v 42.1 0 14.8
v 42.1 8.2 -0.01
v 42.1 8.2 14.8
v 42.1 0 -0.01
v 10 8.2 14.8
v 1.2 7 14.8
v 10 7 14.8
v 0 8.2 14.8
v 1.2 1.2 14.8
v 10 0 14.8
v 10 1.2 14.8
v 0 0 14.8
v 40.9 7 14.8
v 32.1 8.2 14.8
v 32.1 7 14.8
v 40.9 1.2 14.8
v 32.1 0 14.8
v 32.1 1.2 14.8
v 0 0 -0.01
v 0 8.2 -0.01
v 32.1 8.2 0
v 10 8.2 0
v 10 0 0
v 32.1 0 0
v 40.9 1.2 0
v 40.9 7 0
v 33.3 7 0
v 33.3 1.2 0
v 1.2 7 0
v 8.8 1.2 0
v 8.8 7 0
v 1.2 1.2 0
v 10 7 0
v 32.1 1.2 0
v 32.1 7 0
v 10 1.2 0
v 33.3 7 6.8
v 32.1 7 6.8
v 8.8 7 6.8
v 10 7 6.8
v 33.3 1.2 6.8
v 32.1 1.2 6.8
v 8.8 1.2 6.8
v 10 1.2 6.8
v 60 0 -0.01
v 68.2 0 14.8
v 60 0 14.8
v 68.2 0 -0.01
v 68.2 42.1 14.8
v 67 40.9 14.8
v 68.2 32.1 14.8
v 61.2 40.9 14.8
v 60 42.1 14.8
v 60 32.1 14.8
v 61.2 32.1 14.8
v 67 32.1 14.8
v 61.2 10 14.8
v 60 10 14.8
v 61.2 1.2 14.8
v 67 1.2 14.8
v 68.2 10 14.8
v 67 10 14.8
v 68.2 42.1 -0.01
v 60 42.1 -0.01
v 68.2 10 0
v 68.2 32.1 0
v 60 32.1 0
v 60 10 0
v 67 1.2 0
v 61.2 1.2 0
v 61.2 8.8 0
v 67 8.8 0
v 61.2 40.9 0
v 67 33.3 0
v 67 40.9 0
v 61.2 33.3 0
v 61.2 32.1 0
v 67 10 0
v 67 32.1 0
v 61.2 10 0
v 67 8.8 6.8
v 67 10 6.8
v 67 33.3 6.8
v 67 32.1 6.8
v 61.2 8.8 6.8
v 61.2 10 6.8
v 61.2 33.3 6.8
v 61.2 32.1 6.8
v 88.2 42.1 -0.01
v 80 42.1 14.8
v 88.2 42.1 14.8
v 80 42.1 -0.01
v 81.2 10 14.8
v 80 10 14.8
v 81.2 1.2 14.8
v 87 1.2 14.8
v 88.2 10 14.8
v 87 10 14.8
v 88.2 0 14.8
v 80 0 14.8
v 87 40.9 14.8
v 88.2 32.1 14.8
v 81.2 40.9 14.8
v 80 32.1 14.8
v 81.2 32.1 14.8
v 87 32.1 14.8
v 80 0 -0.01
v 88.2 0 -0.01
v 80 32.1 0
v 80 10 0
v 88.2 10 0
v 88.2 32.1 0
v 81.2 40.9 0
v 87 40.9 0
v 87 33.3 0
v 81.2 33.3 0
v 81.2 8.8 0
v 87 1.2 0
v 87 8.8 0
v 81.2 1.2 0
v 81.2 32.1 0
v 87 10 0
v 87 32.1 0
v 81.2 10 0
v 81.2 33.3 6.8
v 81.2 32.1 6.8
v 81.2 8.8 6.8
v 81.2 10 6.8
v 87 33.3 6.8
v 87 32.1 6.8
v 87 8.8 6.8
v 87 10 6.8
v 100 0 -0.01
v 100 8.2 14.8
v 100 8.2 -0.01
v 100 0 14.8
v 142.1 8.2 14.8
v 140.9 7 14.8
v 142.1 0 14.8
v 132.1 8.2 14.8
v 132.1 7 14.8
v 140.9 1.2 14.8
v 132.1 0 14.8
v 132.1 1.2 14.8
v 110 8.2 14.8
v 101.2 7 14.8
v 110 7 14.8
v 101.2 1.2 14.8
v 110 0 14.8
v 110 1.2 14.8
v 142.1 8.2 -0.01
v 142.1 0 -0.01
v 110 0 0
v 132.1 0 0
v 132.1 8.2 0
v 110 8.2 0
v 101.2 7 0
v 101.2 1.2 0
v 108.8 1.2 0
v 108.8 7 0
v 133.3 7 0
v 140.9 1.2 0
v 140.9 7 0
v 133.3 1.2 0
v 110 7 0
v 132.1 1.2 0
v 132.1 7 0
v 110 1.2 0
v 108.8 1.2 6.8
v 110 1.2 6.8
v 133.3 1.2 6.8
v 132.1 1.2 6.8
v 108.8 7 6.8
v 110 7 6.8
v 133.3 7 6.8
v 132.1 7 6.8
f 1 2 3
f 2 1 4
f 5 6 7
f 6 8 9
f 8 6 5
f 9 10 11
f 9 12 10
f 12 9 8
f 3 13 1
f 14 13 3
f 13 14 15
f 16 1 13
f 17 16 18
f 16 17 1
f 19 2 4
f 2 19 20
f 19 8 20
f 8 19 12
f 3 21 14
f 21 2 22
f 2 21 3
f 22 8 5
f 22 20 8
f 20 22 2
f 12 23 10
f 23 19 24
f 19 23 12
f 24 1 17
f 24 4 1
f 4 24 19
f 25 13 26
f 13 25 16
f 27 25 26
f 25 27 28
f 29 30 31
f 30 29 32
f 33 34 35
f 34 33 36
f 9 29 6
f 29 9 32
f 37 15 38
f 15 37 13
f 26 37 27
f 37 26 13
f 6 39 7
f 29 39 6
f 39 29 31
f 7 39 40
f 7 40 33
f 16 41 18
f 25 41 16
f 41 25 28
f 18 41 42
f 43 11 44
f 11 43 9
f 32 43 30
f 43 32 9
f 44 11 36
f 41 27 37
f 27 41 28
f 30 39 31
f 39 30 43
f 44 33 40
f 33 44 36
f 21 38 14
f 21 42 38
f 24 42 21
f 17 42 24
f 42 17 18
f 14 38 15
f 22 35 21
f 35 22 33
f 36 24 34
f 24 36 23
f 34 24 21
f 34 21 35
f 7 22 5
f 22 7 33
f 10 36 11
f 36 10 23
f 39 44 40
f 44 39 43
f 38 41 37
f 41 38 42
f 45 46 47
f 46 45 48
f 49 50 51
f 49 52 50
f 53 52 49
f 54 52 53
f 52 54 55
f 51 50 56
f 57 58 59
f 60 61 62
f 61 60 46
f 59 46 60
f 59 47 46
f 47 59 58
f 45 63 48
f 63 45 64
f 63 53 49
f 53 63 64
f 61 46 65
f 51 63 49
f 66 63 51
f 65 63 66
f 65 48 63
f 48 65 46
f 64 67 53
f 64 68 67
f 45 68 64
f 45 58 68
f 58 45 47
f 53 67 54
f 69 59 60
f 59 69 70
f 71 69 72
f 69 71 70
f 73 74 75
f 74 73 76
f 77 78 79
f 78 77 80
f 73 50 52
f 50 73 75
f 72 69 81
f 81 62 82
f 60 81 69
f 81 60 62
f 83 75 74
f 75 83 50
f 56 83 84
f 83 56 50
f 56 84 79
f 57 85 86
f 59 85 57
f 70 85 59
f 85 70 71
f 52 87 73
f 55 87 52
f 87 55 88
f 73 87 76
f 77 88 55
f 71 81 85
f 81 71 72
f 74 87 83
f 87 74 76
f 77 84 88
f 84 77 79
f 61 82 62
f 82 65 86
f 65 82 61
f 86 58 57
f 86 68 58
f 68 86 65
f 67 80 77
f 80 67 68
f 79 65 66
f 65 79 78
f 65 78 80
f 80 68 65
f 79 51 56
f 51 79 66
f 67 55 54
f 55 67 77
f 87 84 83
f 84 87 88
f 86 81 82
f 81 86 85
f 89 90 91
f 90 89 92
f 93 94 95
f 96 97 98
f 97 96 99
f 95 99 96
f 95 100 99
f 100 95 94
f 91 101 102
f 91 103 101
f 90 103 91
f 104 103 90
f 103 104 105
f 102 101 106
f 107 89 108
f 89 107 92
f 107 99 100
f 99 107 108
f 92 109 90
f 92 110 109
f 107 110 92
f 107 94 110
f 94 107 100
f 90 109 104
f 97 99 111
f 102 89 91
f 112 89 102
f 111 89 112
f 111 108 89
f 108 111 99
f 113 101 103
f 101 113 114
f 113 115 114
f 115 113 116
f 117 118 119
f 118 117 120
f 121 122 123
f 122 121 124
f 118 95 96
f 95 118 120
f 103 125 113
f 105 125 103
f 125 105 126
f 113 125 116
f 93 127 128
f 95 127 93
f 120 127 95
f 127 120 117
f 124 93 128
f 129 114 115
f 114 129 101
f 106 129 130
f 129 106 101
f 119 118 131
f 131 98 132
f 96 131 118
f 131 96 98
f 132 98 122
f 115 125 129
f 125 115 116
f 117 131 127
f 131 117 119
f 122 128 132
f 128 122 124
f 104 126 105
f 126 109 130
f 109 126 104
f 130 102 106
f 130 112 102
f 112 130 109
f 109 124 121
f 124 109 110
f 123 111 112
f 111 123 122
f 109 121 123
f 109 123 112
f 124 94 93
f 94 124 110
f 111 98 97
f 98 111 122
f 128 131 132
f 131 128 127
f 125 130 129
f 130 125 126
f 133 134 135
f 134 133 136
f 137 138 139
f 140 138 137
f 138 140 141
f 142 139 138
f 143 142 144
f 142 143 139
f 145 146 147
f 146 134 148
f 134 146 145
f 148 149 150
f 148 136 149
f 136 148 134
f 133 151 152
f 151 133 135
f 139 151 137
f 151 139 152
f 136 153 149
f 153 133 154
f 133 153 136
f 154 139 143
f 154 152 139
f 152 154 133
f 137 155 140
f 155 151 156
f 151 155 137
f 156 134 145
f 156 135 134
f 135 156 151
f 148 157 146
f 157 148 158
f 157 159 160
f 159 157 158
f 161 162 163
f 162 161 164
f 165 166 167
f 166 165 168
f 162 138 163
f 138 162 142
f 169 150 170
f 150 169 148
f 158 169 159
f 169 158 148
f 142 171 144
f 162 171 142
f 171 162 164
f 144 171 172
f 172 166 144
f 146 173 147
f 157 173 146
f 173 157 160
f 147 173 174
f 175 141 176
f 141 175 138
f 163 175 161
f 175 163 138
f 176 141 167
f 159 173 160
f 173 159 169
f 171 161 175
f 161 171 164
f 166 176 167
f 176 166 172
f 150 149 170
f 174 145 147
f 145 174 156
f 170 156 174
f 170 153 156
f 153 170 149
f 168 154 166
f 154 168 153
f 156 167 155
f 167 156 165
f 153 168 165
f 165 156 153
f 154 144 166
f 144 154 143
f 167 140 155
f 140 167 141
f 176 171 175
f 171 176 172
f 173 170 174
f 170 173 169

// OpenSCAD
// file: ../../Base/Boxes.scad
// Fischertechnik Box Foundation
// Pre-designed Boxes

use <Constants.scad>

include <PlacementOptions.scad>

box190Width = 190;
box190Depth = 130;
box130Width = 130;
box130Depth = 95;
boxUsageHeight = 33.9;
boxWallThickness = 2.4;
boxBaseThickness = 1.0;

// getBoxWallThickness()
// Gets the wall thickness of a Fischertechnik Box

function getBoxWallThickness() = boxWallThickness;

// Gets the usable height of a fischertechnik box
function getBoxUsageHeight() = boxUsageHeight;

// Gets the thickness of the Fischertechnik box base.
function getBoxBaseThickness() = boxBaseThickness;

// Gets the usable inner space of a Box 190 as an x/y-list
function getBox190Space() = [
    box190Width - 2*getBoxWallThickness(), 
    box190Depth - 2*getBoxWallThickness() ];

// Imports the Fischertechnik empty box 130x190 mm and places it at position 0,0
// 190x130 are the outer sizes, the inner space is slightly smaller. Use getBox190Space() to get the inner sizes.
// This module needs the STL file "Fischertechnik Box 130x190.stl" in the library path.
// The box is positioned that the usable inner space is at the 0,0,0 position. The

module Box190() {
    translate([-getBoxWallThickness(),-getBoxWallThickness(),-getBoxBaseThickness()])
        import("Fischertechnik Box 130x190.stl", convexity=3);
}

// Gets the usable inner space of a Box 130 as an x/y-list
function getBox130Space() = [
    box130Width - 2*getBoxWallThickness(), 
    box130Depth - 2*getBoxWallThickness() ];

// Imports the Fischertechnik empty box 95x130 mm and places it at position 0,0
// 190x130 are the outer sizes, the inner space is slightly smaller. Use getBox190Space() to get the inner sizes.
// This module needs the STL file "Fischertechnik Box 95x130.stl" in the library path.
// The box is positioned that the usable inner space is at the 0,0,0 position. The

module Box130() {
    translate([-getBoxWallThickness(),-getBoxWallThickness(),-getBoxBaseThickness()])
        import("Fischertechnik Box 95x130.stl", convexity=3);
}

// Creates a web at the specified box walls
// corner 0 = LowerLeft, 1 = UpperLeft, 2 = UpperRight, 3 = LowerRight
// side 0 = LeftOfCorner, 1 = RightOfCorner
// distance = Distance in mm from the corner
// box = inner width and depth of the box (default: Box 190)
// webWidth = length of the web (default is 3 mms)
// webThickness = thickness of the web (default is 1 mm)

module BoxWeb(corner, side, distance, box=getBox190Space(), webWidth=3, webThickness=1.0) {
    sink = getBoxWallThickness()/2;

    width = (corner % 2 == 0) ? 
            (side == LeftOfCorner ? webWidth : webThickness) :
            (side == LeftOfCorner ? webThickness : webWidth);

    depth = (corner % 2 == 0) ? 
            (side == RightOfCorner ? webWidth : webThickness) :
            (side == RightOfCorner ? webThickness : webWidth);
    
    xDiff = corner == LowerLeft ? 
                (side == LeftOfCorner ? -sink : distance) :
            (corner == UpperLeft ?                
                (side == LeftOfCorner ? distance : -sink) :
            (corner == UpperRight ?
                (side == LeftOfCorner ? box.x-webWidth+sink : box.x-distance-webThickness) :
                (side == LeftOfCorner ? box.x-distance-webThickness: box.x-webWidth+sink)));

    yDiff = corner == LowerLeft ? 
                (side == RightOfCorner ? -sink : distance) :
            (corner == UpperLeft ?
                (side == RightOfCorner ? box.y-distance : box.y-webWidth+sink) :
            (corner == UpperRight ?
                (side == RightOfCorner ? box.y-webWidth+sink : box.y-distance) :
                (side == RightOfCorner ? distance : -sink)));
    
    translate([xDiff, yDiff, -getExcess()])
        cube([width, depth, boxUsageHeight + 2*getExcess()]);
}
// file: ../../Base/Rotation.scad
// Fischertechnik Box Foundation
// Geometry Helpers Rotation

include <PlacementOptions.scad>

// getRotatedSpace(space, rotation=NoRotation)
// Rotates the space dependent on the specified rotation

function getRotatedSpace(space, rotation=NoRotation) = [
    (rotation == Rotate90 || rotation == Rotate270) ? space.y : space.x,
    (rotation == Rotate90 || rotation == Rotate270) ? space.x : space.y
];

// Rotates the given space around the fixed left lower corner
// space = the space the children needs as width/depth list [width,depth]
// rotation = 0 Rotate0 degrees, 1 Rotate90 degrees, 2 Rotate180 degrees, 3 Rotate270 degrees (equivalent to -90)

module RotateFix(space, rotation=Rotate0) {
    dy = (rotation == Rotate0 || rotation == Rotate270) ? 0 :
        (rotation == Rotate90) ? space.x :
        space.y;
    dx = (rotation < Rotate180) ? 0 :
        (rotation == Rotate180) ? space.x :
        space.y;
    
    translate([dx, dy, 0])
        rotate([0, 0, rotations[rotation]])
            children();
}
// file: ../../Base/Alignment.scad
// Fischertechnik Box Foundation
// Geometry Helpers Alignment

include <PlacementOptions.scad>

// getAlignedX(elementWidth, spaceWidth, align=AlignRight, offset=0)
// Gets the aligned X offset of an element with the given
// width in the given space.
// elementWidth = The width of the element to positon
// spaceWidth = The space where the element should be aligned
// align = 0 AlignLeft, 1 AlignCenter, 2 AlignRight
// offset = an optional offset from the aligned position. When
// aligned left or centered, then positive values are in X direction.
// When aligned right then positive values are in negative X direction.

function getAlignedX(elementWidth, spaceWidth, align=AlignRight, offset=0) =
    (align == AlignLeft) ?
        offset :
        ((align == AlignCenter) ?
        (spaceWidth - elementWidth)/2 + offset :
        spaceWidth - offset - elementWidth);

// getAlignedY(elementDepth, spaceDepth, align=AlignTop, offset=0)
// Gets the aligned Y offset of an element with the given
// depth in the given space.
// elementDepth = The depth of the element to positon
// spaceDepth = The space where the element should be aligned
// align = 0 AlignBottom, 1 AlignCenter, 2 AlignTop
// offset = an optional offset from the aligned position. When
// aligned bottom or centered, then positive values are in Y direction.
// When aligned top then positive values are in negative Y direction.

function getAlignedY(elementDepth, spaceDepth, align=AlignTop, offset=0) =
    (align == AlignBottom) ?
        offset :
        ((align == AlignCenter) ?
        (spaceDepth - elementDepth)/2 + offset :
        spaceDepth - offset - elementDepth);
// file: ../../Base/Constants.scad
// Fischertechnik Box Foundation
// Constants

// Constant values necessary for multiple elements

// Base constants
dividerThickness = 1.2;
excess = 0.01;
fragments = 90;
tolerance = 0.8;

// Gets the thickness of a divider 
function getDividerThickness() = dividerThickness;

// Gets the excess that is used to merge walls into each other
function getExcess() = excess;

// Gets amount of fragments of a cylinder
function getFragments() = fragments;

// Gets the inner tolerance of a frame to each side
function getTolerance() = tolerance;


// Fischertechnik specific constants
axisDiameter = 4;
axisBottomDiameter = axisDiameter + 1;
standardEdgeDistance = 2.5;
standardWebDistance = 11.5;
standardCornerLength = 15;
tubeWallFactor = 1.6;

// Gets axis diameter
function getAxisDiameter() = axisDiameter;

// Gets axis bottom diameter for thicker part at the bottom
function getAxisBottomDiameter() = axisBottomDiameter;

// gets the standard distance to the wall of the box for dockable frames with webs
function getStandardEdgeDistance() = standardEdgeDistance;

// gets the standard distance of each web to the corner of the dockable frame
function getStandardWebDistance() = standardWebDistance;

// gets the standard length of the corner walls of a dockable frame
function getStandardCornerLength() = standardCornerLength;

// gets the wall thickness of a tube.
function getTubeWallThickness() = tubeWallFactor * getDividerThickness();
// file: ../../Base/PlacementOptions.scad
// Fischertechnik Box Foundation
// Placement Options

// Alignment
NoAlign = 0;
AlignLeft = 1;
AlignBottom = 2;
AlignCenter = 3;
AlignRight = 4;
AlignTop = 5;

// Element rotation degree steps
rotations = [0, -90, -180, -270];

// Rotation
NoRotation = 0;
Rotate0 = 0;
Rotate90 = 1;
Rotate180 = 2;
Rotate270 = 3;

// Docking (seen from above)
NoDock = -1;
DockLeft = 0;
DockTop = 1;
DockRight = 2;
DockCorner = 2;
DockBottom = 3;

// Web corners
LowerLeft = 0;
UpperLeft = 1;
UpperRight = 2;
LowerRight = 3;

// Web position relative to corner
LeftOfCorner = 0;
RightOfCorner = 1;
// file: ../../Elements/FrameTwoStrut30.scad
// Fischertechnik Box Library
// Frame for two Strut 30
// 38537

use <../ModelBase/Complex.scad>

width = 38.9;
depth = 5.8;
height = 14.8;

// getFrameTwoStrut30Space()
// Gets the space needed for the frame for two struts.
function getFrameTwoStrut30Space() = getElevatedFramesWithCutoffSpace([width, depth, height]);

// FrameTwoConnectors45()
// Frame for two struts 30

module FrameTwoStrut30() {    
    bearingLength = 8.8;
    loadHeight = 8.0;
    
    ElevatedFramesWithCutoff([width, depth, loadHeight], depth, height, bearingLength);
}

// Test
color("lightgray")
FrameTwoStrut30();
// file: ../../Base/Placement.scad
// Fischertechnik Box Foundation
// Geometry Helpers Placement

use <Constants.scad>
use <Alignment.scad>
use <Rotation.scad>
use <Boxes.scad>

include <PlacementOptions.scad>

// Place(x=0, y=0, elementSpace=[0,0], alignX=AlignLeft, alignY=AlignBottom, rotation=Rotate0, boxSpace=getBox190Space())
// Places the child at the specified position
// y = Y-Position. This is a relative position when an X aligment is specified.
// x = X-Position. This is a relative position when an Y aligment is specified.
// elementSpace = space of the element to be placed [x,y]
// alignX = -1=NoAlign, 0 AlignLeft, 1 AlignCenter, 3 AlignRight (elementSpace and boxSpace required!)
// alignY = -1=NoAlign, 2 AlignBottom, 1 AlignCenter, 4 AlignTop (elementSpace and boxSpace required!)
// rotation = 0 Rotate0 0 degrees, 1 Rotate90 90 degrees, 
// 2 Rotate180 180 degrees, 3 Rotate270 270 degrees (equivalent to -90)
// boxSpace = Inner space of the box where the placement occurs [x,y] - default is Box 190x130 inner space

module Place(x=0, y=0, elementSpace=[0,0], 
  alignX=AlignLeft, alignY=AlignBottom, 
  rotation=NoRotation, boxSpace=getBox190Space()) {

    module Position(x, y, space, rotation=Rotate0) {
        translate([x, y, 0])
            RotateFix(space, rotation)
                children(0);
    }

    space = getRotatedSpace(elementSpace, rotation);
    alignedX = getAlignedX(space.x, boxSpace.x, alignX, x);
    alignedY = getAlignedY(space.y, boxSpace.y, alignY, y);
    Position(alignedX, alignedY, elementSpace, rotation)
        children(0);
}

// Center(space=getBox130Space(), elementSpace=[0,0])
// space = Space where the children is centered. For cylinder use centered=true and no elementSpace.
// elementSpace = space of the element to be centered [x,y]

module Center(space=getBox190Space(), elementSpace=[0,0]) {
    translate([(space.x - elementSpace.x) / 2, (space.y - elementSpace.y) / 2])
        children(0);
}

// CenterHorizontal(width=0, y=0, offset=0, space=getBox130Space())
// space = Space where the children is centered. For cylinder use centered=true and no elementSpace.
// elementSpace = space of the element to be centered [x,y]

module CenterHorizontal(width=0, y=0, offset=0, space=getBox190Space()) {
    translate([(space.x - width) / 2 + offset, y])
        children(0);
}

// CenterVertical(depth=0, x=0, offset=0, space=getBox130Space())
// space = Space where the children is centered. For cylinder use centered=true and no elementSpace.
// elementSpace = space of the element to be centered [x,y]

module CenterVerticalal(depth=0, x=0, offset=0, space=getBox190Space()) {
    translate([x, (space.y - depth) / 2 + offset])
        children(0);
}
// main file
// Fischertechnik Box Foundation
// Elements
// Test FrameTwoStrut30

use <../../Base/Placement.scad>
use <../../Elements/FrameTwoStrut30.scad>

include <../../Base/PlacementOptions.scad>

FrameTwoStrut30();

Place(60, 0, getFrameTwoStrut30Space(), rotation=Rotate90)
    FrameTwoStrut30();

Place(80, 0, getFrameTwoStrut30Space(), rotation=Rotate270)
    FrameTwoStrut30();

Place(100, 0, getFrameTwoStrut30Space(), rotation=Rotate180)
    FrameTwoStrut30();
